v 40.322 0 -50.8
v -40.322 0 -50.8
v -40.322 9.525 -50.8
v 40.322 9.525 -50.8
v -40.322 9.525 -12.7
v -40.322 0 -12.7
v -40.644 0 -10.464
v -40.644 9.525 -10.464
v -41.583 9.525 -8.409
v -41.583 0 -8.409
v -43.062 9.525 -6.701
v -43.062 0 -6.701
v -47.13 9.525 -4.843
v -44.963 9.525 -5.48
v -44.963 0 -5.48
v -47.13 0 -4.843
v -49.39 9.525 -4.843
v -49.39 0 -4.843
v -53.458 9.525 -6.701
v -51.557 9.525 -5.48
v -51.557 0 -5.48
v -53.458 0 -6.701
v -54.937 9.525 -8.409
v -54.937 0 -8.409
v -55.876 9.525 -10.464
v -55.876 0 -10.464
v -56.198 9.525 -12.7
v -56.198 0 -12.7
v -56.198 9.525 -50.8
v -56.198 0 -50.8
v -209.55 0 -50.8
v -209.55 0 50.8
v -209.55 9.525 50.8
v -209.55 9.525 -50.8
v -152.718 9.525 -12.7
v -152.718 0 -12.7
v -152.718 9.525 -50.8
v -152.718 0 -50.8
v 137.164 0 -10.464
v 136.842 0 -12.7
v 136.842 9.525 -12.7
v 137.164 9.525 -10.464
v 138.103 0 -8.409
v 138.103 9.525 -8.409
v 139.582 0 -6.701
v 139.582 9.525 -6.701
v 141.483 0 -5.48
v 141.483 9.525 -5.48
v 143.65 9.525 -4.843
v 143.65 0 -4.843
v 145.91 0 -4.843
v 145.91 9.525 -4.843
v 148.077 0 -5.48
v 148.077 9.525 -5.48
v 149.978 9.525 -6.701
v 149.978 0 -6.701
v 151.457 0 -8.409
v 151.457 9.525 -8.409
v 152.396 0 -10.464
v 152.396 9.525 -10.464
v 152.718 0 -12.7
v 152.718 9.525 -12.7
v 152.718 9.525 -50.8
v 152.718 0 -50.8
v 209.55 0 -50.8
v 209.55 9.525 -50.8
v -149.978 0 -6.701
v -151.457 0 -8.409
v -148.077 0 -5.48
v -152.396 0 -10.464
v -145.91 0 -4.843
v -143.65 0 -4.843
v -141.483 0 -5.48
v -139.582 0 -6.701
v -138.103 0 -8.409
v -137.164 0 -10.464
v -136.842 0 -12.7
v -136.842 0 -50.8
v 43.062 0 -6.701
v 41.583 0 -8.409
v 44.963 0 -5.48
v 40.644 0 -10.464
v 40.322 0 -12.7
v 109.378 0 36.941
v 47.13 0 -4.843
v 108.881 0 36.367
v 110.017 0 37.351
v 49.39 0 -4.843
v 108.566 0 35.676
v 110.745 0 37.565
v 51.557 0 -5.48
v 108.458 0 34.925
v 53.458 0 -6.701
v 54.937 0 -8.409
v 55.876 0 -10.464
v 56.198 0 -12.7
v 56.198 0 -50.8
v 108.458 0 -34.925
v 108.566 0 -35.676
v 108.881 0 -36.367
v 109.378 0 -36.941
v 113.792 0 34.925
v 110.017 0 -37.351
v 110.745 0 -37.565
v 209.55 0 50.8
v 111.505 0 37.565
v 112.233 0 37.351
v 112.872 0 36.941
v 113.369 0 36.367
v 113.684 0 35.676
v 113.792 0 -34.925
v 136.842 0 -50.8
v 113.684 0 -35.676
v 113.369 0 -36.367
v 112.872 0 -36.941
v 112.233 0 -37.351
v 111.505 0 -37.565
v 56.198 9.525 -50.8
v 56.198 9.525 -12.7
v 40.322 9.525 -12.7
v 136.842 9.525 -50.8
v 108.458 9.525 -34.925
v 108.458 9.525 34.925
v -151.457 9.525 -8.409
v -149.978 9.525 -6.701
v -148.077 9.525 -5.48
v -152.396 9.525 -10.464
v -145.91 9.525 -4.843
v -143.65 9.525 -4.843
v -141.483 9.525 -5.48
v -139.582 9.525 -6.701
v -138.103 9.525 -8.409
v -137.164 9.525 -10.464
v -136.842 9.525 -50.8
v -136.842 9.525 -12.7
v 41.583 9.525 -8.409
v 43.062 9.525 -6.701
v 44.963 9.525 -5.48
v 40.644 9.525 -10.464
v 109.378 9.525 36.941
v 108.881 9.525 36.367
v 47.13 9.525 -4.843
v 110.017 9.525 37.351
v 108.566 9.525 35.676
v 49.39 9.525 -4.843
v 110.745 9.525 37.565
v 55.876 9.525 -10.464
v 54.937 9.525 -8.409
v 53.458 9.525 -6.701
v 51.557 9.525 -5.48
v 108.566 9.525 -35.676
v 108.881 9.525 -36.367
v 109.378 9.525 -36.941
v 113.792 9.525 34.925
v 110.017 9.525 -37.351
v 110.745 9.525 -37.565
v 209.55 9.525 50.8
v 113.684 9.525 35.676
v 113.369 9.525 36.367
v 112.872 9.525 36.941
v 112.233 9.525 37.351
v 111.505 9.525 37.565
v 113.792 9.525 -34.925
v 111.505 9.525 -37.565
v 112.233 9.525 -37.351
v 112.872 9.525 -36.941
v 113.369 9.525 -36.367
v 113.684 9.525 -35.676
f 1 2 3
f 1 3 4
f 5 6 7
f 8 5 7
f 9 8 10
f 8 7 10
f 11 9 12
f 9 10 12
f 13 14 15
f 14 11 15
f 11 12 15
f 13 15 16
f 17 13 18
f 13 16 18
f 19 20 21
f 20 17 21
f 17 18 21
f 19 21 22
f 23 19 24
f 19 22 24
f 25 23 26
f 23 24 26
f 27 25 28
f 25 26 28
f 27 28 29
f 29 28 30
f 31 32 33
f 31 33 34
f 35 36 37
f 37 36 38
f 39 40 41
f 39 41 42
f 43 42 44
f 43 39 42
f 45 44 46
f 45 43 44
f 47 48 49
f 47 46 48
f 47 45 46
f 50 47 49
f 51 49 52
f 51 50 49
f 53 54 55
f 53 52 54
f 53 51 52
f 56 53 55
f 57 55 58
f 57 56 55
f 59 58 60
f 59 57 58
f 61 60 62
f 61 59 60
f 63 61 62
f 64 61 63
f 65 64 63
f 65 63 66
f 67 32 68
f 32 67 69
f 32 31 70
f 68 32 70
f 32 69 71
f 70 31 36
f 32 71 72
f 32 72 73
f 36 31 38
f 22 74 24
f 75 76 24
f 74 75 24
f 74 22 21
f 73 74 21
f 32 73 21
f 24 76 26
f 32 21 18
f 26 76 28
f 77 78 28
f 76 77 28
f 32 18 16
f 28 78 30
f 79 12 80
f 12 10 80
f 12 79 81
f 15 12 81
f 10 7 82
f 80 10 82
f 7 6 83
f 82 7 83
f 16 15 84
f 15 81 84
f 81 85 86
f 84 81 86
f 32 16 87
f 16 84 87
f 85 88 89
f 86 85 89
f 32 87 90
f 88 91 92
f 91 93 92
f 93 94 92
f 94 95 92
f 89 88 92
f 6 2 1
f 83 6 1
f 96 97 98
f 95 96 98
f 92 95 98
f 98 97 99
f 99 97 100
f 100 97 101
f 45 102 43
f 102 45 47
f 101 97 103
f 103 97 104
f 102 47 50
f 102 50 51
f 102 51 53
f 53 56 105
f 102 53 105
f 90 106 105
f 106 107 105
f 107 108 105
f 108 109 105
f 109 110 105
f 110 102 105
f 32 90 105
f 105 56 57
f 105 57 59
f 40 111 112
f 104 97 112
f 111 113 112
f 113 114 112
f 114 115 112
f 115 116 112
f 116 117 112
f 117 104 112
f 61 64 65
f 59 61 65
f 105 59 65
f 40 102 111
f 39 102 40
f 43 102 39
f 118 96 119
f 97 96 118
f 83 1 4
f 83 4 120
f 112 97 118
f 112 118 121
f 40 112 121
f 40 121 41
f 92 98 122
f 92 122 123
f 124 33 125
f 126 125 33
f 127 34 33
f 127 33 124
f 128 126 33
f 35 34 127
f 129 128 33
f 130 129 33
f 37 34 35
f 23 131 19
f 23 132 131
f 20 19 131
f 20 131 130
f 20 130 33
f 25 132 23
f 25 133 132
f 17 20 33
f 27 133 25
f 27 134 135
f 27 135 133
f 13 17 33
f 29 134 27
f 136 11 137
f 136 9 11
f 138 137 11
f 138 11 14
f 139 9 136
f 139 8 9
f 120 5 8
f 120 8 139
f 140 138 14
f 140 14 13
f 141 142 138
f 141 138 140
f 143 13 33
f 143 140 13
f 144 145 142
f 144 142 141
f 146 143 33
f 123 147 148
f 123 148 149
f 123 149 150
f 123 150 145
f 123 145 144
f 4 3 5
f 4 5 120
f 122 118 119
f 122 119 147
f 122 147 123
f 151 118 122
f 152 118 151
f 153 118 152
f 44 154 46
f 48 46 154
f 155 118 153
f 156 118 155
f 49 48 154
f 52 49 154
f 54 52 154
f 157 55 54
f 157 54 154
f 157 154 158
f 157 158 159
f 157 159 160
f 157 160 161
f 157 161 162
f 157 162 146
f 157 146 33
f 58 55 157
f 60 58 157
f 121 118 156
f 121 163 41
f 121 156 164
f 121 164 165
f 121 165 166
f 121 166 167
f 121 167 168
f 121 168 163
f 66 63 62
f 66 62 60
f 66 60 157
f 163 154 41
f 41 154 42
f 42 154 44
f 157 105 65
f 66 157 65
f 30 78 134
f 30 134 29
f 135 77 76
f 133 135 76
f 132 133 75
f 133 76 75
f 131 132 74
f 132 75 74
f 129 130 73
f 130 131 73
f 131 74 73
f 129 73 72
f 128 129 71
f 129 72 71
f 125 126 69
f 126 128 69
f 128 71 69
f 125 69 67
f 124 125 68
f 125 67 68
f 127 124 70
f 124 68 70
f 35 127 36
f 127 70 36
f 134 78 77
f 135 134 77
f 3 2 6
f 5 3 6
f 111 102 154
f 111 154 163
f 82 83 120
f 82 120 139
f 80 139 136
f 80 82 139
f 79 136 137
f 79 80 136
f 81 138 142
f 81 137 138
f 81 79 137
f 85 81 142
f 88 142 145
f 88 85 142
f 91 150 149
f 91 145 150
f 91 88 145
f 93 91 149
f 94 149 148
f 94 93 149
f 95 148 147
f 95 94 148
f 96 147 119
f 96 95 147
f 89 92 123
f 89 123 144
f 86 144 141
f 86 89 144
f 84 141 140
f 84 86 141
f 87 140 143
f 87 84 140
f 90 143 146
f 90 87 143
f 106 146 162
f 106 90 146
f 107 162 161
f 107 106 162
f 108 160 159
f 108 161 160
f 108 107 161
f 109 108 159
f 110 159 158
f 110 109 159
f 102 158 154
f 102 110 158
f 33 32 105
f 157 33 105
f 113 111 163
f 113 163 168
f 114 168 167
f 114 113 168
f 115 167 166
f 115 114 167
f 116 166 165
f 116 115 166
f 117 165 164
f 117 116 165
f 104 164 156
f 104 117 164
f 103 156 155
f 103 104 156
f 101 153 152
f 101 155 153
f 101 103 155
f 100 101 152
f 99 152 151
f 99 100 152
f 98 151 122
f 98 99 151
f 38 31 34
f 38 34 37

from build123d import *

# Parameters (mm, degrees)
SKETCH50_W          = 419.1
SKETCH50_H          = 101.6
BOSS_EXTRUDE4_DEPTH = 9.525
CUT_EXTRUDE7_REACH  = 217.83
CUT_EXTRUDE8_REACH  = 217.83


with BuildPart() as part:
    # Sketch50 → Boss-Extrude4 (new body)
    with BuildSketch(Plane(origin=(0, 0, 0), x_dir=(1, 0, 0), z_dir=(0, 1, 0))):
        Rectangle(SKETCH50_W, SKETCH50_H)
    extrude(amount=BOSS_EXTRUDE4_DEPTH)

    # Sketch51 → Cut-Extrude7 (cut, up to next)
    with BuildSketch(Plane.XZ, mode=Mode.PRIVATE) as cut_extrude7_sk1:
        with BuildLine():
            Line((152.7175, -12.7), (152.7175, -50.8))
            ThreePointArc((152.7175, -50.8), (144.78, -58.7375), (136.8425, -50.8))
            Line((136.8425, -50.8), (136.8425, -12.7))
            ThreePointArc((136.8425, -12.7), (144.78, -4.7625), (152.7175, -12.7))
        make_face()
    cut_extrude7_tool1 = extrude(cut_extrude7_sk1.sketch, amount=-CUT_EXTRUDE7_REACH, mode=Mode.PRIVATE) & part.part
    # Sketch51 → Cut-Extrude7 (cut, up to next)
    with BuildSketch(Plane.XZ, mode=Mode.PRIVATE) as cut_extrude7_sk2:
        with BuildLine():
            Line((40.3225, -50.8), (40.3225, -12.7))
            ThreePointArc((40.3225, -12.7), (48.26, -4.7625), (56.1975, -12.7))
            Line((56.1975, -12.7), (56.1975, -50.8))
            ThreePointArc((56.1975, -50.8), (48.26, -58.7375), (40.3225, -50.8))
        make_face()
    cut_extrude7_tool2 = extrude(cut_extrude7_sk2.sketch, amount=-CUT_EXTRUDE7_REACH, mode=Mode.PRIVATE) & part.part
    cut_extrude7_1 = cut_extrude7_tool1.solids().sort_by_distance((144.78, 0, -31.75))[0]
    add(cut_extrude7_1, mode=Mode.SUBTRACT)
    cut_extrude7_2 = cut_extrude7_tool2.solids().sort_by_distance((48.26, 0, -31.75))[0]
    add(cut_extrude7_2, mode=Mode.SUBTRACT)
    cut_extrude7 = cut_extrude7_1 + cut_extrude7_2  # Cut-Extrude7 as one shape, for the pattern or mirror that repeats it

    # Mirror4: Cut-Extrude7 across plane
    add(cut_extrude7.mirror(Plane(origin=(0, 0, 0), x_dir=(0, 0, 1), z_dir=(1, 0, 0))), mode=Mode.SUBTRACT)

    # Sketch55 → Cut-Extrude8 (cut, up to next)
    with BuildSketch(Plane.XZ, mode=Mode.PRIVATE) as cut_extrude8_sk1:
        with BuildLine():
            Line((113.792, 34.925), (113.792, -34.925))
            ThreePointArc((113.792, -34.925), (111.125, -37.592), (108.458, -34.925))
            Line((108.458, -34.925), (108.458, 34.925))
            ThreePointArc((108.458, 34.925), (111.125, 37.592), (113.792, 34.925))
        make_face()
    cut_extrude8_tool1 = extrude(cut_extrude8_sk1.sketch, amount=-CUT_EXTRUDE8_REACH, mode=Mode.PRIVATE) & part.part
    add(cut_extrude8_tool1.solids().sort_by_distance((111.125, 0, 0))[0], mode=Mode.SUBTRACT)


solid = part.part
